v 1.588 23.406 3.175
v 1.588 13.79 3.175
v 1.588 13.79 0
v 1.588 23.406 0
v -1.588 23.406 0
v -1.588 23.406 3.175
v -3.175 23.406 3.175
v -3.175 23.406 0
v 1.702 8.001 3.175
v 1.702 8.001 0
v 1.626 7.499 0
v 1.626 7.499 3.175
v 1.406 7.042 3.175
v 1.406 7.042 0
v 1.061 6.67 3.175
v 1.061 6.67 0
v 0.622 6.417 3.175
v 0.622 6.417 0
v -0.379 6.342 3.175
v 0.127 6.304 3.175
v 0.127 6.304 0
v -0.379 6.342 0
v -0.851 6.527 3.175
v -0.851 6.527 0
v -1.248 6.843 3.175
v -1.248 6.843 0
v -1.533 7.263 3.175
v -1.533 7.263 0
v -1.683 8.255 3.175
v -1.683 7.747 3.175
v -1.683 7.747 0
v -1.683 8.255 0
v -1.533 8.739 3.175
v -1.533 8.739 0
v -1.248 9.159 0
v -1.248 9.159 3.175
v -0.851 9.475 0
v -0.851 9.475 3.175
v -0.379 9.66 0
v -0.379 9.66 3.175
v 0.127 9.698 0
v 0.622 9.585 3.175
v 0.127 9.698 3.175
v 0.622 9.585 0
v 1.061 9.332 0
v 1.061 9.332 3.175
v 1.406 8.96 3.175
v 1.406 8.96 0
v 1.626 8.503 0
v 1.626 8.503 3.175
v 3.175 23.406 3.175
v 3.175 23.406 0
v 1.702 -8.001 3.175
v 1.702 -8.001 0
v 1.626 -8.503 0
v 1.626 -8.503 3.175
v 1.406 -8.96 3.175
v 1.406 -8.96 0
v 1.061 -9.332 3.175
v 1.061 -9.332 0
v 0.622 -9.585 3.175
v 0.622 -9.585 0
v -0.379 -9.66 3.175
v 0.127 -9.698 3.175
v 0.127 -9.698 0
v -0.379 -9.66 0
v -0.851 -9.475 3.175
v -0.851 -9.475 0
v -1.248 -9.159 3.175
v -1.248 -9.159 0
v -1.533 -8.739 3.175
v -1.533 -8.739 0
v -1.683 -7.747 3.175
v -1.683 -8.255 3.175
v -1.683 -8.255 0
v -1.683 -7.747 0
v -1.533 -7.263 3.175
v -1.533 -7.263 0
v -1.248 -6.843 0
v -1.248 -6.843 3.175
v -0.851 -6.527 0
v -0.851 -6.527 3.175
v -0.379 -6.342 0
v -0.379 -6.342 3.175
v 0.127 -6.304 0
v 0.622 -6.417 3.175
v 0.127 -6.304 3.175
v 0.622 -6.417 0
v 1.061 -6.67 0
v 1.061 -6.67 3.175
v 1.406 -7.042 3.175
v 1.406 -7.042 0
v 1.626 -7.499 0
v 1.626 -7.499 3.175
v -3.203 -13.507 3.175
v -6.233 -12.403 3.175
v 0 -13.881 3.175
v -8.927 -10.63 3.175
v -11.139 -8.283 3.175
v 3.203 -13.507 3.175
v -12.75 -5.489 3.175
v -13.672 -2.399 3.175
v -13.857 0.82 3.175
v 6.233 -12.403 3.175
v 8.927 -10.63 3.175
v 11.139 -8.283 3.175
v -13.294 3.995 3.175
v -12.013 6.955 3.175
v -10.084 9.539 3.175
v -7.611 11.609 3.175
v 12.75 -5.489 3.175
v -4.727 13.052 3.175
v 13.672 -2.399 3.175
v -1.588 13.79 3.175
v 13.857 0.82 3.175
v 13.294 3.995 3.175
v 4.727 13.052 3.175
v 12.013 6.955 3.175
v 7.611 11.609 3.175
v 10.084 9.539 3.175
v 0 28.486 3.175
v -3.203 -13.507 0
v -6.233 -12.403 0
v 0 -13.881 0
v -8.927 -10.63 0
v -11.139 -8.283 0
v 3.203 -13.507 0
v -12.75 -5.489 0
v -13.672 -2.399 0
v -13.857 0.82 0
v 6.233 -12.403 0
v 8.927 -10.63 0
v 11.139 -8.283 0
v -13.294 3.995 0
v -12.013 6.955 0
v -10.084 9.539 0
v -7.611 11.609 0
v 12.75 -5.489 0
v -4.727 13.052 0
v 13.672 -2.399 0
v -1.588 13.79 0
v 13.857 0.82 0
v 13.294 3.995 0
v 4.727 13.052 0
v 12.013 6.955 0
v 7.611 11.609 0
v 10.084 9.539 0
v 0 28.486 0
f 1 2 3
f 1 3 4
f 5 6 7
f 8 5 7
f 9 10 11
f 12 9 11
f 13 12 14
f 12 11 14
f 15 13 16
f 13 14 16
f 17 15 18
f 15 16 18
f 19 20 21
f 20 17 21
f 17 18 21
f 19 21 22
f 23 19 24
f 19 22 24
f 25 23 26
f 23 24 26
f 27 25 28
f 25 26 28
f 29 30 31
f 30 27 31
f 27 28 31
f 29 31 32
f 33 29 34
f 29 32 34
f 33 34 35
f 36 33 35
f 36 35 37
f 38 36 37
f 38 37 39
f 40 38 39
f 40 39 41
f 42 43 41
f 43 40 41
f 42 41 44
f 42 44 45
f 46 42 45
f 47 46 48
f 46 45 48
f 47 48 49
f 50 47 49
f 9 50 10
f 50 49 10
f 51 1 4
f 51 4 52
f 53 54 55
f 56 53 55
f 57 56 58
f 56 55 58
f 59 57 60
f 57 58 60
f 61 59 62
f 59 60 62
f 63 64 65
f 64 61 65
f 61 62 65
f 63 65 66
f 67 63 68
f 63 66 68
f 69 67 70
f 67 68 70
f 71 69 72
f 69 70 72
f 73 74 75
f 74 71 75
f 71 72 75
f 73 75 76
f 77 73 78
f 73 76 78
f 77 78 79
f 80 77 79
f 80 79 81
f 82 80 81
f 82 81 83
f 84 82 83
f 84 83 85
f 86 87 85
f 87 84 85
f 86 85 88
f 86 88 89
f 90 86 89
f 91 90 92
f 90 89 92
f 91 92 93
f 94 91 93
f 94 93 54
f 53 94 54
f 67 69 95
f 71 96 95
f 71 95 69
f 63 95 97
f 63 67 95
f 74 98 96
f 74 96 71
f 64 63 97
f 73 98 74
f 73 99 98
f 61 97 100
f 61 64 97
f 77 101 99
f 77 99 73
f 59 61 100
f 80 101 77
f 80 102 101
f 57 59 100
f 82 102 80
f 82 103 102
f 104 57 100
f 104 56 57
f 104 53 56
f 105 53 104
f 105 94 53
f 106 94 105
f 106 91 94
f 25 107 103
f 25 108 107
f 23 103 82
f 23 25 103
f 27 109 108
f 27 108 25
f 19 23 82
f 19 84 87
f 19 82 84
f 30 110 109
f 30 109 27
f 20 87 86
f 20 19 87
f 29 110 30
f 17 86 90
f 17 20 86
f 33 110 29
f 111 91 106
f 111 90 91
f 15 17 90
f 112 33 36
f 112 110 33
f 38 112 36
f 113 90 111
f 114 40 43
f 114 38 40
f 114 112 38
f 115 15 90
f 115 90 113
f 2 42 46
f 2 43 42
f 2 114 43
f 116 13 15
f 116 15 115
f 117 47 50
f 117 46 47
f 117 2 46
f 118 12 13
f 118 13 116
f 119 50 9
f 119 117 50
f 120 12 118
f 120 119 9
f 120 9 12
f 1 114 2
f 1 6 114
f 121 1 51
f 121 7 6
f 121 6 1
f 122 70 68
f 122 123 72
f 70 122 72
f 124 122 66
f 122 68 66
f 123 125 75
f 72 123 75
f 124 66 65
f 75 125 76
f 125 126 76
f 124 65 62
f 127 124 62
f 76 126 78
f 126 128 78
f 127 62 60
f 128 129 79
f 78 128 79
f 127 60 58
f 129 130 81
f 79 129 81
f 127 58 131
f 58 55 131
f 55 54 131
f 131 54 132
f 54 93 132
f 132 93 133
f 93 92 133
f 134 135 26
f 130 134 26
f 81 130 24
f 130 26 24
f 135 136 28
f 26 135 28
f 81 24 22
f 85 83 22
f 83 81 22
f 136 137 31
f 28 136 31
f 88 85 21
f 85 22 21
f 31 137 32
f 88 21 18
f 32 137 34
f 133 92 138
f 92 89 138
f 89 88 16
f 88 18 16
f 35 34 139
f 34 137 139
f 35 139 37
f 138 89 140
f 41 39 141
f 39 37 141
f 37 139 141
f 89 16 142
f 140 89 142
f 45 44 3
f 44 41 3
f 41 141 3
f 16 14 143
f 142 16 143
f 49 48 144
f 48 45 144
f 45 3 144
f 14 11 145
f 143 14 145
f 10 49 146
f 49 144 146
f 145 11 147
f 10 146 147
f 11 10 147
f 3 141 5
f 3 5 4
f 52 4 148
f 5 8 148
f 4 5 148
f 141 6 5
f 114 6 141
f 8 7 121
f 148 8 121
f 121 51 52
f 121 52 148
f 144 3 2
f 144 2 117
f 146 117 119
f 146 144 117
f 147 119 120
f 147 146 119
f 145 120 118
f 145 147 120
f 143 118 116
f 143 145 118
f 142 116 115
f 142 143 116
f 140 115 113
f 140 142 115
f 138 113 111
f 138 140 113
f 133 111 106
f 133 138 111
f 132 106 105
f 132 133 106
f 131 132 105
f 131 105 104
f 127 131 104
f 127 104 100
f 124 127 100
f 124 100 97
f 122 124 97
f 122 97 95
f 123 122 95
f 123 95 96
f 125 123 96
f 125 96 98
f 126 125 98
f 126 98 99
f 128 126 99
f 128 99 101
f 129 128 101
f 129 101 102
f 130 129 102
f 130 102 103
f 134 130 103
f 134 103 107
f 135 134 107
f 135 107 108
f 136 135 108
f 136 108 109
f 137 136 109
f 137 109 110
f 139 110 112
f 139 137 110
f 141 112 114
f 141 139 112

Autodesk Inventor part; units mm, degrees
ref_plane "YZ Plane" through (0, 0, 0) normal (1, 0, 0) x (0, 1, 0)
ref_plane "XZ Plane" through (0, 0, 0) normal (0, 1, 0) x (-1, 0, 0)
ref_plane "XY Plane" through (0, 0, 0) normal (0, 0, 1) x (1, 0, 0)
sketch "Sketch1" plane through (0, 0, 0) normal (0, 0, 1) x (1, 0, 0)
  circle A0 centre (0, 0) radius 13.8811
  circle A1 centre (0, 0) radius 4.445
  circle A2 centre (0, 8.001) radius 1.7018
  circle A3 centre (0, -8.001) radius 1.7018
  dimension "d0" = 27.7622
  dimension "d1" = 8.89
  dimension "d2" = 16.002
  dimension "d3" = 8.001
  dimension "d4" = 3.4036
  dimension "d5" = 3.4036
extrude "Extrusion1" add sketch "Sketch1" along normal blind 3.175 contours A0 | A1
sketch "Sketch2" plane through (0, 0, 3.175) normal (0, 0, 1) x (1, 0, 0)
  line L0 (-1.5875, 12.7) -> (1.5875, 12.7)
  line L1 (1.5875, 12.7) -> (1.5875, 23.4061)
  line L2 (1.5875, 23.4061) -> (-1.5875, 23.4061)
  line L3 (-1.5875, 23.4061) -> (-1.5875, 12.7)
  circle A0 centre (0, 0) radius 13.8811 projected
  line L4 (0, 23.4061) -> (-3.175, 23.4061)
  line L5 (-3.175, 23.4061) -> (0, 28.4861)
  line L6 (0, 23.4061) -> (0, 21.3049) construction
  line L7 (0, 23.4061) -> (3.175, 23.4061)
  line L8 (3.175, 23.4061) -> (0, 28.4861)
  point P0 (0, 12.7)
  point P1 (-1.5875, 13.79)
  point P2 (1.5875, 13.79)
  dimension "d8" = 3.175
  dimension "d9" = 9.525
  dimension "d10" = 5.08
  dimension "d11" = 3.175
  dimension "d14" = 12.7
extrude "Extrusion2" add sketch "Sketch2" against normal up to surface (3.175 mm away) contours L3 A0 L1 L0 | L3 L2 L1 A0 | L4 L5 L8 L7 L2 picked at (-0.1767, 13.0903)
equation "\"d3\" = 0.5 * d2"
properties part number "Arrow_Top"
